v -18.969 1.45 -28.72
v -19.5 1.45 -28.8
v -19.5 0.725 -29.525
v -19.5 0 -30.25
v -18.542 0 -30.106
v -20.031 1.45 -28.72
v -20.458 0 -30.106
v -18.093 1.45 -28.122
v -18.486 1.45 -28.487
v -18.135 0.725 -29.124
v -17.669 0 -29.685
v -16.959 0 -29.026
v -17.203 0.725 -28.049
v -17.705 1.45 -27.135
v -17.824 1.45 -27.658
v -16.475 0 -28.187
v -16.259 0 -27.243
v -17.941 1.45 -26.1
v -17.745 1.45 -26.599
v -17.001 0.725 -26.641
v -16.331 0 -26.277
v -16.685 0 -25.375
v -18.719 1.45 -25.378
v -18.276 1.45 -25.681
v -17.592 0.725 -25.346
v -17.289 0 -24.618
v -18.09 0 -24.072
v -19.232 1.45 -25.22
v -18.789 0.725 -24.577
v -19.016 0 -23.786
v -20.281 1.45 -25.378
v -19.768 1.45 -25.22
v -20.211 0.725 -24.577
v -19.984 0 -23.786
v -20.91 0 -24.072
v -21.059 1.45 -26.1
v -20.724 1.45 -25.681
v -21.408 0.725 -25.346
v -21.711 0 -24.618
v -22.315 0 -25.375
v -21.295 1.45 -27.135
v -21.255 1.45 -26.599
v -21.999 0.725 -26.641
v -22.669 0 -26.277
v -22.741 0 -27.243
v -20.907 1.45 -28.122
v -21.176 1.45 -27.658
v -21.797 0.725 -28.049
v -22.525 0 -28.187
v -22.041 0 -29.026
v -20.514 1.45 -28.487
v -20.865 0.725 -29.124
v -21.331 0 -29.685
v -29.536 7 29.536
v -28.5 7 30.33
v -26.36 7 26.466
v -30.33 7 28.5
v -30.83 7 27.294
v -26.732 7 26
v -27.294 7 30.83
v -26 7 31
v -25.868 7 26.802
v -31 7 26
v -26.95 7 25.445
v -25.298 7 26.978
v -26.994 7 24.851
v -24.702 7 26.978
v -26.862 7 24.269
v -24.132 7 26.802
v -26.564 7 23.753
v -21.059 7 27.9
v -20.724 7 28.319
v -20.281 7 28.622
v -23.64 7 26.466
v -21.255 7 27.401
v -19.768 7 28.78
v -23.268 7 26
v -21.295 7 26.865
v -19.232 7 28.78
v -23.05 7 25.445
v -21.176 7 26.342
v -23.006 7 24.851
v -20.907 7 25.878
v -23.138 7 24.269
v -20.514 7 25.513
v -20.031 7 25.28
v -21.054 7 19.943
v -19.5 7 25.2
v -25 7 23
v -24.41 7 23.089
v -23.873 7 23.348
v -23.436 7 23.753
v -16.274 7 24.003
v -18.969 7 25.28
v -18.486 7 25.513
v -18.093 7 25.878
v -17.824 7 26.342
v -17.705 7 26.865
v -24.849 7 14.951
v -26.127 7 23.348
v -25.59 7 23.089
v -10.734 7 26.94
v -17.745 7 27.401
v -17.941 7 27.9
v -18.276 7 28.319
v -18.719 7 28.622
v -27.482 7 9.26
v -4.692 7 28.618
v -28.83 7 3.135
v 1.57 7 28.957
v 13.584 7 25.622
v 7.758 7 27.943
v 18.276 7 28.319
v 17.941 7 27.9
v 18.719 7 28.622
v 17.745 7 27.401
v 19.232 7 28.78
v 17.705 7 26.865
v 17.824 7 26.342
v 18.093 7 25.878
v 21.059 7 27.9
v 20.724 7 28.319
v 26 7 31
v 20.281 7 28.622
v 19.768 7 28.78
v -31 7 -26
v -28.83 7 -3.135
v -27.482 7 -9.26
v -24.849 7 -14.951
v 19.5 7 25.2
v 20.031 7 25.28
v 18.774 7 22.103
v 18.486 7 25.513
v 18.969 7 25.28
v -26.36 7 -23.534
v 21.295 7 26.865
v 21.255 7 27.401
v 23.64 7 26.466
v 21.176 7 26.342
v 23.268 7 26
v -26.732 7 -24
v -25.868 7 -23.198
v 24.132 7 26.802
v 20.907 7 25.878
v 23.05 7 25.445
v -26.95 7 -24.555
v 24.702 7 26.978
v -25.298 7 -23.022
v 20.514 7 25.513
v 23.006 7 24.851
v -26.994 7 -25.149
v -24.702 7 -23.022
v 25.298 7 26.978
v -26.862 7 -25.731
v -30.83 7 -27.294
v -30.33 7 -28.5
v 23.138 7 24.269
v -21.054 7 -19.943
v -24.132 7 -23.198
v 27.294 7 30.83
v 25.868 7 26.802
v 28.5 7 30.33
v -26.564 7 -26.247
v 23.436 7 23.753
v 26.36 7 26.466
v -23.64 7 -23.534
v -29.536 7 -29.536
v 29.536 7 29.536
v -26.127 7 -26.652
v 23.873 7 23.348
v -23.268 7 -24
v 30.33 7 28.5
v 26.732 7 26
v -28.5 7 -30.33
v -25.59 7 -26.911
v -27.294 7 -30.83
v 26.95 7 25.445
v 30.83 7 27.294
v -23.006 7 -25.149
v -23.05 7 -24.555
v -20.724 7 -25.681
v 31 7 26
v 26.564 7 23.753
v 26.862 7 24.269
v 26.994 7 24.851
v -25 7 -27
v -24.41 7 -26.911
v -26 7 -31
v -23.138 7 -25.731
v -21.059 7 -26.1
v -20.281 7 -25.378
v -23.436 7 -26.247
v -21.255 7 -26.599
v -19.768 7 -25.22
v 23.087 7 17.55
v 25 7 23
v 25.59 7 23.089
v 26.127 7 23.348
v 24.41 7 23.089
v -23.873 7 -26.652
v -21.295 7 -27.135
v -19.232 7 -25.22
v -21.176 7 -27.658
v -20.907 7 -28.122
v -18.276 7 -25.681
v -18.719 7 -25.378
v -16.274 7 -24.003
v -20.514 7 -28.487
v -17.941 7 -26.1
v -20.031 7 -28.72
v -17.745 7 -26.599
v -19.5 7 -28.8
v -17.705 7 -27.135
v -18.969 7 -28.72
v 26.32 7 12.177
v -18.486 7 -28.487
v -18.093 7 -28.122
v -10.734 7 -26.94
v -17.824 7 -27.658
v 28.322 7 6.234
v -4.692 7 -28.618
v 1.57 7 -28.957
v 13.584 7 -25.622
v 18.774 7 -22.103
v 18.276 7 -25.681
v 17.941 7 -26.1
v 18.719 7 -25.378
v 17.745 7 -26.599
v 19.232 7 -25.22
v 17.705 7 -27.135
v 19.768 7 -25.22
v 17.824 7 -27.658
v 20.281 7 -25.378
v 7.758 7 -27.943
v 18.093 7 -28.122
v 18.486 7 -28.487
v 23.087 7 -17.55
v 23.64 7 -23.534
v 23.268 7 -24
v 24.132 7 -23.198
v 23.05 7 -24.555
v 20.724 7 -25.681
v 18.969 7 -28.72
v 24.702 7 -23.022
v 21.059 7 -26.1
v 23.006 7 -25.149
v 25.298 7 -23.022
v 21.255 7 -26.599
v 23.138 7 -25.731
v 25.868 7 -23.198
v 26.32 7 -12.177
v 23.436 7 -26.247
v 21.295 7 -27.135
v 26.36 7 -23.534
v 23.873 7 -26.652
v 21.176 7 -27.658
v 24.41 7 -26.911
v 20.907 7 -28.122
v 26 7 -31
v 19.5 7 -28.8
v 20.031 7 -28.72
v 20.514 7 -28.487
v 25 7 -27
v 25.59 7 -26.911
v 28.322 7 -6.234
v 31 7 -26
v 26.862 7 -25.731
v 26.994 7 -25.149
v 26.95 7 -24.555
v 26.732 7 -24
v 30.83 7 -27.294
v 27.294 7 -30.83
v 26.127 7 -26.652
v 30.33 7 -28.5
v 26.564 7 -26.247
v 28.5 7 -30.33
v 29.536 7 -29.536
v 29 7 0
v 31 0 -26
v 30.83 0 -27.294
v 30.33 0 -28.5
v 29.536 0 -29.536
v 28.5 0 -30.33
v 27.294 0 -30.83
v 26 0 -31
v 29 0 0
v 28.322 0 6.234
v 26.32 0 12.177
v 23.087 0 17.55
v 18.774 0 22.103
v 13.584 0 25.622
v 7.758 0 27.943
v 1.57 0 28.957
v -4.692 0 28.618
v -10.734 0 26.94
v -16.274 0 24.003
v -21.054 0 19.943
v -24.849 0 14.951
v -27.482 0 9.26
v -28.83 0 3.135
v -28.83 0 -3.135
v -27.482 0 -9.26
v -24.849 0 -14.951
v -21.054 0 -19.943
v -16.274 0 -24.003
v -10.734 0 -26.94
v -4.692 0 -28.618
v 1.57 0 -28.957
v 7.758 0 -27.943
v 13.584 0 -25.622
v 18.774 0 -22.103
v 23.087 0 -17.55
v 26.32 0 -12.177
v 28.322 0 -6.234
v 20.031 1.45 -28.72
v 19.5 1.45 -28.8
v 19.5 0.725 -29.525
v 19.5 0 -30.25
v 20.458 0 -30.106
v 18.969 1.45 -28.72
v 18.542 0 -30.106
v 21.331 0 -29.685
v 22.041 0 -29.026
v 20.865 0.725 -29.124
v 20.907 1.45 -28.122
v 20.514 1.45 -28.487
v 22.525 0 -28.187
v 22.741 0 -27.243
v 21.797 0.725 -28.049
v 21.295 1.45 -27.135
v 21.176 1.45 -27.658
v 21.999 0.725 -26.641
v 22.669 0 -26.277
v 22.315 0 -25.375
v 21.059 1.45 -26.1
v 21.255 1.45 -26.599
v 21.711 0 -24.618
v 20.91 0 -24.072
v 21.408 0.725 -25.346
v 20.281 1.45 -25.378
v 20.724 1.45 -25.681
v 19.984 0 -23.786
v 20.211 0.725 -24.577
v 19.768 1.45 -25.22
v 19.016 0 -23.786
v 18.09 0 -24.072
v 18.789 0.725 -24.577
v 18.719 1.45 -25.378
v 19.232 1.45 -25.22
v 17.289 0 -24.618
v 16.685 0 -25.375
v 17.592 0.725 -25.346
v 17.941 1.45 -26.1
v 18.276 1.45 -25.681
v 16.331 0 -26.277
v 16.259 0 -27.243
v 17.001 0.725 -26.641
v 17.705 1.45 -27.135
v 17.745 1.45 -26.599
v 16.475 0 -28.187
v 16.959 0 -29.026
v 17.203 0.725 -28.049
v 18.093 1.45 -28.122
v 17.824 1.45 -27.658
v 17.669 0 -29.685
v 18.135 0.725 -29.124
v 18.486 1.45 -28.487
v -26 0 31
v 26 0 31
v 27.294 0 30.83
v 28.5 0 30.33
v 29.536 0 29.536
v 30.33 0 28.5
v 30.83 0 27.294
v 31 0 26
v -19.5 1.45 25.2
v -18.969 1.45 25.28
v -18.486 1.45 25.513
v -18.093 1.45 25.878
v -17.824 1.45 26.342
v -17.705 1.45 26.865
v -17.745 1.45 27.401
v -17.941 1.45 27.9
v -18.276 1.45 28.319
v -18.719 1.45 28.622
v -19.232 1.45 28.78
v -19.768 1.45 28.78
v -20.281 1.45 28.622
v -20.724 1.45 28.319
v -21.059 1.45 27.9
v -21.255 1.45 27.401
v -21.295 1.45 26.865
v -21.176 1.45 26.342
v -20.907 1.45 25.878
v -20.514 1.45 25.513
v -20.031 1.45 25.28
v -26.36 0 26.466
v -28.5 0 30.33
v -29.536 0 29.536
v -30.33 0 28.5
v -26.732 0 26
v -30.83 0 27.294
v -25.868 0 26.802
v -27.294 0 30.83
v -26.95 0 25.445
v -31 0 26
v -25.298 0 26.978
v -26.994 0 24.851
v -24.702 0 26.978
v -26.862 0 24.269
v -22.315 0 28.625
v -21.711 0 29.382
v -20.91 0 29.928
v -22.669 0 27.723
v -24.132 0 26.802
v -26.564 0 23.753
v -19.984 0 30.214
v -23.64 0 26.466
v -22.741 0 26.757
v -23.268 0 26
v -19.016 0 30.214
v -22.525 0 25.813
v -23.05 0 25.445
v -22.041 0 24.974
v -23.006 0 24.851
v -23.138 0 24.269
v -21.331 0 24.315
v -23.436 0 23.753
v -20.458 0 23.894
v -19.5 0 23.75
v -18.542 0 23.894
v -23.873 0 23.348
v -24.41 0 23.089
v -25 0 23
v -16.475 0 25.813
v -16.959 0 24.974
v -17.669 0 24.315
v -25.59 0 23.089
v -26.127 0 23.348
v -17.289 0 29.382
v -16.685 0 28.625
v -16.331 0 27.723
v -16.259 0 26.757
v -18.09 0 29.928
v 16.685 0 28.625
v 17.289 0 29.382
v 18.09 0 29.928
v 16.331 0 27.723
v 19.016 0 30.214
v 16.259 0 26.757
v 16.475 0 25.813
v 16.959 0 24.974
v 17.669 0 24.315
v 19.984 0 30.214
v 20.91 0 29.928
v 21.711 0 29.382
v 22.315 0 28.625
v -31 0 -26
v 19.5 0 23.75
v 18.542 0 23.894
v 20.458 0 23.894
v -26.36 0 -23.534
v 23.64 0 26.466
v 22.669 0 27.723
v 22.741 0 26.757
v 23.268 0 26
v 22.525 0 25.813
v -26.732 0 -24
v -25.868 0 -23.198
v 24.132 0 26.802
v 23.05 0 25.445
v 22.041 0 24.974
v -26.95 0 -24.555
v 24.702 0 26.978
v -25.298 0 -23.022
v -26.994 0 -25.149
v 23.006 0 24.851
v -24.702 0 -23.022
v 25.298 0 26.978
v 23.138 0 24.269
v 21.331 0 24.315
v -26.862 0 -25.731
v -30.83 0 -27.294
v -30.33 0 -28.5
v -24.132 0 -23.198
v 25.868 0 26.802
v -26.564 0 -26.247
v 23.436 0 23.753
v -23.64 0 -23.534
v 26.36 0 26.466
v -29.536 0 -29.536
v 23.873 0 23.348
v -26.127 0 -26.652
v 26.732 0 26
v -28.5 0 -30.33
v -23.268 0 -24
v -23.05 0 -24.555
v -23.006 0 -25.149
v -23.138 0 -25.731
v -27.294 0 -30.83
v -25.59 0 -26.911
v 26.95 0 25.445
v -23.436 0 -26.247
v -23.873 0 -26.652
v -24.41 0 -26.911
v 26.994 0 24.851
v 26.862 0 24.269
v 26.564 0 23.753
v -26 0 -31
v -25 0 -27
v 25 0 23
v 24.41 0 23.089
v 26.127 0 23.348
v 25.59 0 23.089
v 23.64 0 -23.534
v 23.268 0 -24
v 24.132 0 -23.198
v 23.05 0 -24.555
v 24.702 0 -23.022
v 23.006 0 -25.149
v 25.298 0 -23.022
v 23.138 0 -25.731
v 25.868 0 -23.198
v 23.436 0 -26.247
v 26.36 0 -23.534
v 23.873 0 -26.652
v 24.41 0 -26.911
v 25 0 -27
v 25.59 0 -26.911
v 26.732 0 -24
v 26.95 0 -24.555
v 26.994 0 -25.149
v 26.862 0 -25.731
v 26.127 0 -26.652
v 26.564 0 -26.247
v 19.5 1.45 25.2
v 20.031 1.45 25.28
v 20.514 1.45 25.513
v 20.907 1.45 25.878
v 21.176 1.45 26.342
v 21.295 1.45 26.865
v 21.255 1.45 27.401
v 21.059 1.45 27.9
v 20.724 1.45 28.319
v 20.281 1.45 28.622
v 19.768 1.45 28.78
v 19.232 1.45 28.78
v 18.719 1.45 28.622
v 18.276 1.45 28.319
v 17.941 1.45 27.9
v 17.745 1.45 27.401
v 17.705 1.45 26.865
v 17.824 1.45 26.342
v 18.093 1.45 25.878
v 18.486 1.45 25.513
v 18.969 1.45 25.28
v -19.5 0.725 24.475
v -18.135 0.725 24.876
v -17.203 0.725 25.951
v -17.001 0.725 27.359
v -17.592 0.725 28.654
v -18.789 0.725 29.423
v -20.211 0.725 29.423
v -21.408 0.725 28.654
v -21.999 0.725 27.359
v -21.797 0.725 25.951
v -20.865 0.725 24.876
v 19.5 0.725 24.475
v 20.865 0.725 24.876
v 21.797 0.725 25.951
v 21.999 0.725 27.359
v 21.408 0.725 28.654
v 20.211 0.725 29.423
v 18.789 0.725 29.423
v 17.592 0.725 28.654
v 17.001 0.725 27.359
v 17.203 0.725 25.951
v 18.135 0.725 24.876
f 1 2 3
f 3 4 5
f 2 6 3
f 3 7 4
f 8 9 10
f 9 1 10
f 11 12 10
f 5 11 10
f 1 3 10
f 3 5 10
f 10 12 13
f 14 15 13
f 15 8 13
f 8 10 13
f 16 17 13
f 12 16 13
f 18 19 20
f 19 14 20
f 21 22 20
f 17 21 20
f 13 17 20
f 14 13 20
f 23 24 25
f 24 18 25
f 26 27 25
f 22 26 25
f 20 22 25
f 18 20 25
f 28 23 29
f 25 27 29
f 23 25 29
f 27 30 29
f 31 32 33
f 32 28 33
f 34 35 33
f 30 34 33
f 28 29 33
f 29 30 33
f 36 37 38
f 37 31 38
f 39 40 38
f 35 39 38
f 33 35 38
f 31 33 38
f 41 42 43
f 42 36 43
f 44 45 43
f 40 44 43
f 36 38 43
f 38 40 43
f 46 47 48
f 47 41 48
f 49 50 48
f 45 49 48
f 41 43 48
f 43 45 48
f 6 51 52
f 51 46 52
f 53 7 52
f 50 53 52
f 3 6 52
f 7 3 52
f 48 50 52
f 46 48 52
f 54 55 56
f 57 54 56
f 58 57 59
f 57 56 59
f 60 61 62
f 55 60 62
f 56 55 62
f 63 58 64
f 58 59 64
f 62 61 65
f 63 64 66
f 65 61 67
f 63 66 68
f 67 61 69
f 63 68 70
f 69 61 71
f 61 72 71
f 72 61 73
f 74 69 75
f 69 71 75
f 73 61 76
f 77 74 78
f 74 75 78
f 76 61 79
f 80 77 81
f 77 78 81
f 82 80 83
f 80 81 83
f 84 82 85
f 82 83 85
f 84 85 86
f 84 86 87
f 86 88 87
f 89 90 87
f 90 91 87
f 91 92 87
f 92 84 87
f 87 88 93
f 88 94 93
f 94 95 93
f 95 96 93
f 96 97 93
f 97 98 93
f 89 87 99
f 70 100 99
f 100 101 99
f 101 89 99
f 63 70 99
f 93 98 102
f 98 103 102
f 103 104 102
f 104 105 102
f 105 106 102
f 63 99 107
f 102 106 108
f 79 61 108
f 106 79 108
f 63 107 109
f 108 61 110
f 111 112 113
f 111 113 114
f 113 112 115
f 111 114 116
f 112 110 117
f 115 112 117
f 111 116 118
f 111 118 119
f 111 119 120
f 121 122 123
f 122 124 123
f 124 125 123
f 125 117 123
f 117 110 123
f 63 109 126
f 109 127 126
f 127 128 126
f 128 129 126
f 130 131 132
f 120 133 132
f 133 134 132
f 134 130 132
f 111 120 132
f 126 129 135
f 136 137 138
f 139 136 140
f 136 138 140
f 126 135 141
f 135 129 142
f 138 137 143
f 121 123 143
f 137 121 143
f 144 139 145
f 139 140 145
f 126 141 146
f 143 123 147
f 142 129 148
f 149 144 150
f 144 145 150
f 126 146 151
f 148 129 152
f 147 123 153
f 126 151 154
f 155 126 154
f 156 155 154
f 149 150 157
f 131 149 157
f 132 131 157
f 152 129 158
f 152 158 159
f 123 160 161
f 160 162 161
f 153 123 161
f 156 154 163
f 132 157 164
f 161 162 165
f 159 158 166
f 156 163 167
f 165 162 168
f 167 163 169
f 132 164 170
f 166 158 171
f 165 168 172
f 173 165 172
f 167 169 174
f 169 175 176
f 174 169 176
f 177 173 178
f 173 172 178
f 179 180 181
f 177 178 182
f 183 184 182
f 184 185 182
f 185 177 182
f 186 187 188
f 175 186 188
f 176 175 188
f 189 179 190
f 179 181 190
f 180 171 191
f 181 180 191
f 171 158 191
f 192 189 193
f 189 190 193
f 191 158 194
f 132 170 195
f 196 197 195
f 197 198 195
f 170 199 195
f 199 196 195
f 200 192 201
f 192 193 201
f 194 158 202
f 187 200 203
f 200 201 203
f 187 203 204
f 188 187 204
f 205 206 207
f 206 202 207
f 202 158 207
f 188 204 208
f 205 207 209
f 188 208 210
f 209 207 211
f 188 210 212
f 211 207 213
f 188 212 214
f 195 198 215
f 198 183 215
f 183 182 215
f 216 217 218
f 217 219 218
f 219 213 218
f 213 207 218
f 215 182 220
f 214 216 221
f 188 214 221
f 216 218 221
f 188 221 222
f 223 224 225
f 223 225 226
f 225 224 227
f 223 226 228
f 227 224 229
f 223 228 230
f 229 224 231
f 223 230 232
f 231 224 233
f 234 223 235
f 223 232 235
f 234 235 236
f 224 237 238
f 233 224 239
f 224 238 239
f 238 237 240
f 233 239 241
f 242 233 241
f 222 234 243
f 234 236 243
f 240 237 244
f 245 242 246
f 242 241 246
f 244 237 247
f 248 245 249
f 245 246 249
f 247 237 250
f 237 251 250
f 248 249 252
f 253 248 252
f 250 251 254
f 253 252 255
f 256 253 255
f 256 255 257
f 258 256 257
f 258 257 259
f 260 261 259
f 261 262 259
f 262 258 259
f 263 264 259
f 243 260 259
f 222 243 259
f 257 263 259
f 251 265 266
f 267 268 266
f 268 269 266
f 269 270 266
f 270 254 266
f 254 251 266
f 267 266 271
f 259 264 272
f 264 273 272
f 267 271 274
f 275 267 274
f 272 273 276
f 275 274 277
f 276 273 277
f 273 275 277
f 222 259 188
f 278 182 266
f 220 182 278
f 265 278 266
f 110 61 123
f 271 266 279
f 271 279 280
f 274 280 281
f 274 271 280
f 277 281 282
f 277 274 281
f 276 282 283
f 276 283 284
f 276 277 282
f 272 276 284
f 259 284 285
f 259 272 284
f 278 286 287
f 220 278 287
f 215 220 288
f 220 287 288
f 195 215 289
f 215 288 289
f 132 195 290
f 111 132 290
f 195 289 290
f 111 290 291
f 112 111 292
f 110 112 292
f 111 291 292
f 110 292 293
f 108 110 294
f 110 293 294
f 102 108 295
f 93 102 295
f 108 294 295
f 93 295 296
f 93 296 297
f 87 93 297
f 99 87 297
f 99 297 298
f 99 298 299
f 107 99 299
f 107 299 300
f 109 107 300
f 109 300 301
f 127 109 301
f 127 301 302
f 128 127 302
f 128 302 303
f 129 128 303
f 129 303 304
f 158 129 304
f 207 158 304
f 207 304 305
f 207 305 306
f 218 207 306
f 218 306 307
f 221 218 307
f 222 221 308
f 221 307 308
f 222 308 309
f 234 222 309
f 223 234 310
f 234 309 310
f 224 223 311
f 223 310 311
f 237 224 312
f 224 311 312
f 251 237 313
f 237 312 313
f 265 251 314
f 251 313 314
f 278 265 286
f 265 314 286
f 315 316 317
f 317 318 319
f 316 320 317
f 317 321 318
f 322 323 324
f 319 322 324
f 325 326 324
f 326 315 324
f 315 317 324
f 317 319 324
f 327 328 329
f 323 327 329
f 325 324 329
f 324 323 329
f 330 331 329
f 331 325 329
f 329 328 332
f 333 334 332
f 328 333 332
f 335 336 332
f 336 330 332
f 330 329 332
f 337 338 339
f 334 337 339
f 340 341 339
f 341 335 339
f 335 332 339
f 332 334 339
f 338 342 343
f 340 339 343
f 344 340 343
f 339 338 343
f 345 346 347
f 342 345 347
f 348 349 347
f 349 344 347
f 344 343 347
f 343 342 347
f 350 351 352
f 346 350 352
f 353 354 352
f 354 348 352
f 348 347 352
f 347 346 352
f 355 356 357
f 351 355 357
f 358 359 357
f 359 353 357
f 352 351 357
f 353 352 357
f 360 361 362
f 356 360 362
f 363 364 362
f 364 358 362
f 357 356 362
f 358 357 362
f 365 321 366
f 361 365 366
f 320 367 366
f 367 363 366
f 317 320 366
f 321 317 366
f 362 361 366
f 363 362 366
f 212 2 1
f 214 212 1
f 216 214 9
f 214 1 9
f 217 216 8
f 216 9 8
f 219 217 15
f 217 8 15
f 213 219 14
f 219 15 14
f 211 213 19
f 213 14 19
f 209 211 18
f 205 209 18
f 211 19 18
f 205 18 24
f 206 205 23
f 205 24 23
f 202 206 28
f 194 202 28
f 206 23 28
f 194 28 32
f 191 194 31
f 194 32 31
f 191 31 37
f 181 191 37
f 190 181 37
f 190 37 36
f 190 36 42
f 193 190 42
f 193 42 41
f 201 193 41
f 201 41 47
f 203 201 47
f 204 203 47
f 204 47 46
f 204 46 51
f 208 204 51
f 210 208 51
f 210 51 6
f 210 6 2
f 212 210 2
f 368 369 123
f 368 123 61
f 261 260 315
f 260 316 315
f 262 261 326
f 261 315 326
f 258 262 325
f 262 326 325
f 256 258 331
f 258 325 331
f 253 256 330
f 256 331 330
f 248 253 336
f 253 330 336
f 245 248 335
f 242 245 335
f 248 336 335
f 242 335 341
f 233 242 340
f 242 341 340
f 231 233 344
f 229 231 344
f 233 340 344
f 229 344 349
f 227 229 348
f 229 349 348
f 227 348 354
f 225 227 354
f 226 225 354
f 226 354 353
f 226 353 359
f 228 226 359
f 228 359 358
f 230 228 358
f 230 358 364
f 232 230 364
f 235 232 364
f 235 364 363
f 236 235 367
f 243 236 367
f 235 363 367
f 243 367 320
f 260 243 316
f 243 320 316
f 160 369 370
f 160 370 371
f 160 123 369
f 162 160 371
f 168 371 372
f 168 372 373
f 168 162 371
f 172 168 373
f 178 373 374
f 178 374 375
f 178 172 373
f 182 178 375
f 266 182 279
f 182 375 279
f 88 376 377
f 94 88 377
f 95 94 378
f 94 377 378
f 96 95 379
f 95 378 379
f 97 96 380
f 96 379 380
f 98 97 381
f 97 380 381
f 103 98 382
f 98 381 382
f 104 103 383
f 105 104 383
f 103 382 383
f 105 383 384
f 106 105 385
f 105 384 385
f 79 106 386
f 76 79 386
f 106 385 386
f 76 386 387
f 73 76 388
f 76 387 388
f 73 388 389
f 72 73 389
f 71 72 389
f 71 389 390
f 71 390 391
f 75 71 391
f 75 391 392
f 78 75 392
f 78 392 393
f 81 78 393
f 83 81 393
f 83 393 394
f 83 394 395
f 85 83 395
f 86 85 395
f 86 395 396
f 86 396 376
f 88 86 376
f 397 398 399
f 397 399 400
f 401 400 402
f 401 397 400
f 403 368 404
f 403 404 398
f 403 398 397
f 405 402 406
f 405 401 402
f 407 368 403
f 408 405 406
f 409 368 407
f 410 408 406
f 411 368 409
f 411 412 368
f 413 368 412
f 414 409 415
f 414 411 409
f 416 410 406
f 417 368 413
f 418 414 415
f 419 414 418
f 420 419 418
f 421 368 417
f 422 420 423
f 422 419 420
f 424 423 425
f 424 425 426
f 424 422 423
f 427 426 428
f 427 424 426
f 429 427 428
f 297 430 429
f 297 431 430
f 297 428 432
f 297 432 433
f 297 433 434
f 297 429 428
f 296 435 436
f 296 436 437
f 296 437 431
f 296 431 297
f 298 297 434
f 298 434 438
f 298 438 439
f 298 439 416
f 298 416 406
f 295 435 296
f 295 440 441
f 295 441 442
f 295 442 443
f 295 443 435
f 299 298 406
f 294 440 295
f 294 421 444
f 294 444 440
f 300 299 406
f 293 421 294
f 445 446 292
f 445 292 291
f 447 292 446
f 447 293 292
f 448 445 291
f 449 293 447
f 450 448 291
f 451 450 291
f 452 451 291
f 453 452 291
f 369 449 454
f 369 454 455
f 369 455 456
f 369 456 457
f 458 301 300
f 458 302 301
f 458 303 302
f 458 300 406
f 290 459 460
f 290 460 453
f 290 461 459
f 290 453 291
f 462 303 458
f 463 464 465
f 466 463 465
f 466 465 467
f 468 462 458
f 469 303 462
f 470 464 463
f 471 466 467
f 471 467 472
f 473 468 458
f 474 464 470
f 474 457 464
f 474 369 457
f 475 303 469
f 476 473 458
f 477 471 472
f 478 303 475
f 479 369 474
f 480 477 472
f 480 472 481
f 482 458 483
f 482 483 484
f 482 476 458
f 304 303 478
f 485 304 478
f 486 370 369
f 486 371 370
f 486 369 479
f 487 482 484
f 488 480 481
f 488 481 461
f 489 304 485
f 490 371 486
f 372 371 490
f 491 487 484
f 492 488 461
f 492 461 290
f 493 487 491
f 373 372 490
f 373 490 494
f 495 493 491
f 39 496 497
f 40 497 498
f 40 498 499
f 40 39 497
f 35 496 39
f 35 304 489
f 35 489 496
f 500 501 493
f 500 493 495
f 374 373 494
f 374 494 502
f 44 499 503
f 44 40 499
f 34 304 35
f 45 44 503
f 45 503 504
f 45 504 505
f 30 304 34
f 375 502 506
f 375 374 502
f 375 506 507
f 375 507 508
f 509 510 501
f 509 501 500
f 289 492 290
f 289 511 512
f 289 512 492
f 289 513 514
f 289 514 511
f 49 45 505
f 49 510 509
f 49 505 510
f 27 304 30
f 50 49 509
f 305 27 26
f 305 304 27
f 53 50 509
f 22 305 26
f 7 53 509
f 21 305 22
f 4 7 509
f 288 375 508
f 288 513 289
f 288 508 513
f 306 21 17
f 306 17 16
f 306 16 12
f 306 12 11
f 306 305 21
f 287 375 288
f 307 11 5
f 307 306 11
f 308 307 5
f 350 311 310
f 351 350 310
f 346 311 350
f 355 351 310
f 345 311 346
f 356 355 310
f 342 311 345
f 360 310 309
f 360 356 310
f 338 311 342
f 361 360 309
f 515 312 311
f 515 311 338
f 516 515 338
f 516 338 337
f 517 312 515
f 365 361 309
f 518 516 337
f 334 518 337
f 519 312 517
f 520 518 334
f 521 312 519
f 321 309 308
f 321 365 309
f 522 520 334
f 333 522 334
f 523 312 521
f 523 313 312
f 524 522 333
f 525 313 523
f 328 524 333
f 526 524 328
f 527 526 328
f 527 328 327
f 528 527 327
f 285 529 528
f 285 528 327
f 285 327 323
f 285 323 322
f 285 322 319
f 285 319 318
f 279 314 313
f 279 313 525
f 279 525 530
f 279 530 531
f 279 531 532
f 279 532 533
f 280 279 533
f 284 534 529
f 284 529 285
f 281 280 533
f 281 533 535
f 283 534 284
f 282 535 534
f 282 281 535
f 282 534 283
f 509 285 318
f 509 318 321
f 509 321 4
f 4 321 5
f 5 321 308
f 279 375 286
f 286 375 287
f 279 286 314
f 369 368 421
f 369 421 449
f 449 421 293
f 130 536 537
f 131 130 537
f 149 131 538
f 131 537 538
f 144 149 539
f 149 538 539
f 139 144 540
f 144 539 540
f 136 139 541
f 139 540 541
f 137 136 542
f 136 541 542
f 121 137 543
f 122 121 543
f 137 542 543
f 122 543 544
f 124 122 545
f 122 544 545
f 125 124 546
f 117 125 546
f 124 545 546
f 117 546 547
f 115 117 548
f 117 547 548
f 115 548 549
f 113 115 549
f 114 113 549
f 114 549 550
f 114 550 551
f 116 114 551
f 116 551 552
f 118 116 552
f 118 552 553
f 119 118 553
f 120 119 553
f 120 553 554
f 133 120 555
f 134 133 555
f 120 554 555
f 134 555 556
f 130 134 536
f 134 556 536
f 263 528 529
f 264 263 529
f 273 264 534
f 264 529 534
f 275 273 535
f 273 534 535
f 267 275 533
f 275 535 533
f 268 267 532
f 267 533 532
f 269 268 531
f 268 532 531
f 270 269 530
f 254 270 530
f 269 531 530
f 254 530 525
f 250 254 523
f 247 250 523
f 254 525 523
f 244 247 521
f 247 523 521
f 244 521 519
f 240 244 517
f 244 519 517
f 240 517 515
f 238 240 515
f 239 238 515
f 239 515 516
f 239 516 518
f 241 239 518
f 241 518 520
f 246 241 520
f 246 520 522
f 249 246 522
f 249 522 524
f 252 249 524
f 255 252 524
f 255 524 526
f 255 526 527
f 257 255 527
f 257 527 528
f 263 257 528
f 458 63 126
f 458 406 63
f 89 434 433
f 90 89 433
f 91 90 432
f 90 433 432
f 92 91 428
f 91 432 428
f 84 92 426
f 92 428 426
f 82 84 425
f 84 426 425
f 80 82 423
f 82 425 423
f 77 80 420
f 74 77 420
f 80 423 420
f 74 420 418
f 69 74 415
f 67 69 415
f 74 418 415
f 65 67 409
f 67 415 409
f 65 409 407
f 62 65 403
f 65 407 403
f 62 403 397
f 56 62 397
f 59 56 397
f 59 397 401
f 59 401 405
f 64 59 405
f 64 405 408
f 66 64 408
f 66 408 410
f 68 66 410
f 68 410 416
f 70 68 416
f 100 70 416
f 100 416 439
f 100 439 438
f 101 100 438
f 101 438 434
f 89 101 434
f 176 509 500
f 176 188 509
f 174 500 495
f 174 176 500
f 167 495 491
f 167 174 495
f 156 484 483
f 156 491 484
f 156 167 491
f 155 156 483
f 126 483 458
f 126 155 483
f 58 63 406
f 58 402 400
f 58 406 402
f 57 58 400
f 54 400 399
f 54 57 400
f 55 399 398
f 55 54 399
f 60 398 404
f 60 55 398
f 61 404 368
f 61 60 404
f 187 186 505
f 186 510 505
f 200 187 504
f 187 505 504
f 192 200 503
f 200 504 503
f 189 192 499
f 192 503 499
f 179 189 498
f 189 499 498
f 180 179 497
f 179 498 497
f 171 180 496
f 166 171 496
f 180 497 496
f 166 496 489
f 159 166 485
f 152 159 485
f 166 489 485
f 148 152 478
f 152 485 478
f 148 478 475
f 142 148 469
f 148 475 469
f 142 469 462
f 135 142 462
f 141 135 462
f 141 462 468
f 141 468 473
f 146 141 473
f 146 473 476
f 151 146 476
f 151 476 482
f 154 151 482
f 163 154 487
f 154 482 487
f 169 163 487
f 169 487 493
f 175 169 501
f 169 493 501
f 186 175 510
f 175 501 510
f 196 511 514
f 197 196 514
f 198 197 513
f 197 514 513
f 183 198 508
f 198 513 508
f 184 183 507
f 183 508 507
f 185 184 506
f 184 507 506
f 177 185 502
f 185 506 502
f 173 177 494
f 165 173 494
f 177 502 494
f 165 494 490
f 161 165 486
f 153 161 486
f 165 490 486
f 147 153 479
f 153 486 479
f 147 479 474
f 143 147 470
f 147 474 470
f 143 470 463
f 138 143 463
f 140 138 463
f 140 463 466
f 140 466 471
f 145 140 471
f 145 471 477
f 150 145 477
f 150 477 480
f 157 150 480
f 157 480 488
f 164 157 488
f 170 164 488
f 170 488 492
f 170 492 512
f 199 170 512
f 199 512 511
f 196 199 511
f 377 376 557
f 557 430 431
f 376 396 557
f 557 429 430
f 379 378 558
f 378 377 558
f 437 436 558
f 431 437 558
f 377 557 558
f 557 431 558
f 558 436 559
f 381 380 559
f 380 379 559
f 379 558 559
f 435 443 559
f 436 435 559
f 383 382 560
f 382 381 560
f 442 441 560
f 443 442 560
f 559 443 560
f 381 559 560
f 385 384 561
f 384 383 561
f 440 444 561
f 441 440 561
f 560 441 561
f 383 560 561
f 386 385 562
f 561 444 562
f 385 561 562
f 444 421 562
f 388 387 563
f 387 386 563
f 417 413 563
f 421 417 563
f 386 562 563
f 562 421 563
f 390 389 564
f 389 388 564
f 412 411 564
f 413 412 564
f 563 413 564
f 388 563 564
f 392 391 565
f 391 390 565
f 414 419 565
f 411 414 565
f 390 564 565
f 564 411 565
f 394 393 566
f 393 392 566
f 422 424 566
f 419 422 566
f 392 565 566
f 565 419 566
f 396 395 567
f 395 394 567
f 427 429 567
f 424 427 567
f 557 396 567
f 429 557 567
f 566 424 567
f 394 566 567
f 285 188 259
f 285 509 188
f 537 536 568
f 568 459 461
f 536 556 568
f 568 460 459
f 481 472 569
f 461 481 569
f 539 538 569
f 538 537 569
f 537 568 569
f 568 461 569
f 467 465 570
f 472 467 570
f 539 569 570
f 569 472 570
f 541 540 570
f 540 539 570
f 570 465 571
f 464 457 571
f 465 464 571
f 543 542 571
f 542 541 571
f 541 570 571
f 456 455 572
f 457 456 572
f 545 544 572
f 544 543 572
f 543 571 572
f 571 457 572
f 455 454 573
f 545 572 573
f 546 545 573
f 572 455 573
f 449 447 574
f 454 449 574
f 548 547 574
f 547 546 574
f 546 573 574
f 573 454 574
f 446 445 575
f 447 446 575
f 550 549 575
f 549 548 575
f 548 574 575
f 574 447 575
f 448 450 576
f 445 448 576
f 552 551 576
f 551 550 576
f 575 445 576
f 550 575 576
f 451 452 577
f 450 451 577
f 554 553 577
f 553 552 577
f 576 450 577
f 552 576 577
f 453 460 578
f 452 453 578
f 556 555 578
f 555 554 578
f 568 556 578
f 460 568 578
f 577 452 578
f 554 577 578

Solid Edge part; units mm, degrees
sketch "Sketch1" plane through (0, 0, 0) normal (0, -1, 0) x (1, 0, 0)
  circle A0 centre (0, 0) radius 29
  line L0 (31, 31) -> (-31, 31)
  line L1 (-31, 31) -> (-31, -31)
  line L2 (-31, -31) -> (31, -31)
  line L3 (31, 31) -> (31, -31)
  dimension "D1" = 62
  dimension "D2" = 58
  dimension "D3" = 62
  dimension "D4" = 31
  dimension "D5" = 31
extrude "Protrusion1" add sketch "Sketch1" against normal blind 7
hole "Bohrung_17" at (-25, 0, 25) direction (0, 1, 0) diameter 4 end up to next
hole "Hole1" at (25, 0, 25) direction (0, 1, 0) diameter 4 end up to next
hole "Hole2" at (25, 0, -25) direction (0, 1, 0) diameter 4 end up to next
hole "Hole3" at (-25, 0, -25) direction (0, 1, 0) diameter 4 end up to next
hole "Bohrung_21" at (-19.5, 0, 27) direction (0, 1, 0) diameter 3.6 end up to next countersink diameter 6.5 countersink angle 90
hole "Hole4" at (19.5, 0, 27) direction (0, 1, 0) diameter 3.6 end up to next countersink diameter 6.5 countersink angle 90
hole "Hole5" at (19.5, 0, -27) direction (0, 1, 0) diameter 3.6 end up to next countersink diameter 6.5 countersink angle 90
hole "Hole6" at (-19.5, 0, -27) direction (0, 1, 0) diameter 3.6 end up to next countersink diameter 6.5 countersink angle 90
fillet "Verrundung_1" radius 5 4 edges at (31, 3.5, -31) (-31, 3.5, -31) (-31, 3.5, 31) (31, 3.5, 31)
properties part number "42" material "Polyacticacid"
